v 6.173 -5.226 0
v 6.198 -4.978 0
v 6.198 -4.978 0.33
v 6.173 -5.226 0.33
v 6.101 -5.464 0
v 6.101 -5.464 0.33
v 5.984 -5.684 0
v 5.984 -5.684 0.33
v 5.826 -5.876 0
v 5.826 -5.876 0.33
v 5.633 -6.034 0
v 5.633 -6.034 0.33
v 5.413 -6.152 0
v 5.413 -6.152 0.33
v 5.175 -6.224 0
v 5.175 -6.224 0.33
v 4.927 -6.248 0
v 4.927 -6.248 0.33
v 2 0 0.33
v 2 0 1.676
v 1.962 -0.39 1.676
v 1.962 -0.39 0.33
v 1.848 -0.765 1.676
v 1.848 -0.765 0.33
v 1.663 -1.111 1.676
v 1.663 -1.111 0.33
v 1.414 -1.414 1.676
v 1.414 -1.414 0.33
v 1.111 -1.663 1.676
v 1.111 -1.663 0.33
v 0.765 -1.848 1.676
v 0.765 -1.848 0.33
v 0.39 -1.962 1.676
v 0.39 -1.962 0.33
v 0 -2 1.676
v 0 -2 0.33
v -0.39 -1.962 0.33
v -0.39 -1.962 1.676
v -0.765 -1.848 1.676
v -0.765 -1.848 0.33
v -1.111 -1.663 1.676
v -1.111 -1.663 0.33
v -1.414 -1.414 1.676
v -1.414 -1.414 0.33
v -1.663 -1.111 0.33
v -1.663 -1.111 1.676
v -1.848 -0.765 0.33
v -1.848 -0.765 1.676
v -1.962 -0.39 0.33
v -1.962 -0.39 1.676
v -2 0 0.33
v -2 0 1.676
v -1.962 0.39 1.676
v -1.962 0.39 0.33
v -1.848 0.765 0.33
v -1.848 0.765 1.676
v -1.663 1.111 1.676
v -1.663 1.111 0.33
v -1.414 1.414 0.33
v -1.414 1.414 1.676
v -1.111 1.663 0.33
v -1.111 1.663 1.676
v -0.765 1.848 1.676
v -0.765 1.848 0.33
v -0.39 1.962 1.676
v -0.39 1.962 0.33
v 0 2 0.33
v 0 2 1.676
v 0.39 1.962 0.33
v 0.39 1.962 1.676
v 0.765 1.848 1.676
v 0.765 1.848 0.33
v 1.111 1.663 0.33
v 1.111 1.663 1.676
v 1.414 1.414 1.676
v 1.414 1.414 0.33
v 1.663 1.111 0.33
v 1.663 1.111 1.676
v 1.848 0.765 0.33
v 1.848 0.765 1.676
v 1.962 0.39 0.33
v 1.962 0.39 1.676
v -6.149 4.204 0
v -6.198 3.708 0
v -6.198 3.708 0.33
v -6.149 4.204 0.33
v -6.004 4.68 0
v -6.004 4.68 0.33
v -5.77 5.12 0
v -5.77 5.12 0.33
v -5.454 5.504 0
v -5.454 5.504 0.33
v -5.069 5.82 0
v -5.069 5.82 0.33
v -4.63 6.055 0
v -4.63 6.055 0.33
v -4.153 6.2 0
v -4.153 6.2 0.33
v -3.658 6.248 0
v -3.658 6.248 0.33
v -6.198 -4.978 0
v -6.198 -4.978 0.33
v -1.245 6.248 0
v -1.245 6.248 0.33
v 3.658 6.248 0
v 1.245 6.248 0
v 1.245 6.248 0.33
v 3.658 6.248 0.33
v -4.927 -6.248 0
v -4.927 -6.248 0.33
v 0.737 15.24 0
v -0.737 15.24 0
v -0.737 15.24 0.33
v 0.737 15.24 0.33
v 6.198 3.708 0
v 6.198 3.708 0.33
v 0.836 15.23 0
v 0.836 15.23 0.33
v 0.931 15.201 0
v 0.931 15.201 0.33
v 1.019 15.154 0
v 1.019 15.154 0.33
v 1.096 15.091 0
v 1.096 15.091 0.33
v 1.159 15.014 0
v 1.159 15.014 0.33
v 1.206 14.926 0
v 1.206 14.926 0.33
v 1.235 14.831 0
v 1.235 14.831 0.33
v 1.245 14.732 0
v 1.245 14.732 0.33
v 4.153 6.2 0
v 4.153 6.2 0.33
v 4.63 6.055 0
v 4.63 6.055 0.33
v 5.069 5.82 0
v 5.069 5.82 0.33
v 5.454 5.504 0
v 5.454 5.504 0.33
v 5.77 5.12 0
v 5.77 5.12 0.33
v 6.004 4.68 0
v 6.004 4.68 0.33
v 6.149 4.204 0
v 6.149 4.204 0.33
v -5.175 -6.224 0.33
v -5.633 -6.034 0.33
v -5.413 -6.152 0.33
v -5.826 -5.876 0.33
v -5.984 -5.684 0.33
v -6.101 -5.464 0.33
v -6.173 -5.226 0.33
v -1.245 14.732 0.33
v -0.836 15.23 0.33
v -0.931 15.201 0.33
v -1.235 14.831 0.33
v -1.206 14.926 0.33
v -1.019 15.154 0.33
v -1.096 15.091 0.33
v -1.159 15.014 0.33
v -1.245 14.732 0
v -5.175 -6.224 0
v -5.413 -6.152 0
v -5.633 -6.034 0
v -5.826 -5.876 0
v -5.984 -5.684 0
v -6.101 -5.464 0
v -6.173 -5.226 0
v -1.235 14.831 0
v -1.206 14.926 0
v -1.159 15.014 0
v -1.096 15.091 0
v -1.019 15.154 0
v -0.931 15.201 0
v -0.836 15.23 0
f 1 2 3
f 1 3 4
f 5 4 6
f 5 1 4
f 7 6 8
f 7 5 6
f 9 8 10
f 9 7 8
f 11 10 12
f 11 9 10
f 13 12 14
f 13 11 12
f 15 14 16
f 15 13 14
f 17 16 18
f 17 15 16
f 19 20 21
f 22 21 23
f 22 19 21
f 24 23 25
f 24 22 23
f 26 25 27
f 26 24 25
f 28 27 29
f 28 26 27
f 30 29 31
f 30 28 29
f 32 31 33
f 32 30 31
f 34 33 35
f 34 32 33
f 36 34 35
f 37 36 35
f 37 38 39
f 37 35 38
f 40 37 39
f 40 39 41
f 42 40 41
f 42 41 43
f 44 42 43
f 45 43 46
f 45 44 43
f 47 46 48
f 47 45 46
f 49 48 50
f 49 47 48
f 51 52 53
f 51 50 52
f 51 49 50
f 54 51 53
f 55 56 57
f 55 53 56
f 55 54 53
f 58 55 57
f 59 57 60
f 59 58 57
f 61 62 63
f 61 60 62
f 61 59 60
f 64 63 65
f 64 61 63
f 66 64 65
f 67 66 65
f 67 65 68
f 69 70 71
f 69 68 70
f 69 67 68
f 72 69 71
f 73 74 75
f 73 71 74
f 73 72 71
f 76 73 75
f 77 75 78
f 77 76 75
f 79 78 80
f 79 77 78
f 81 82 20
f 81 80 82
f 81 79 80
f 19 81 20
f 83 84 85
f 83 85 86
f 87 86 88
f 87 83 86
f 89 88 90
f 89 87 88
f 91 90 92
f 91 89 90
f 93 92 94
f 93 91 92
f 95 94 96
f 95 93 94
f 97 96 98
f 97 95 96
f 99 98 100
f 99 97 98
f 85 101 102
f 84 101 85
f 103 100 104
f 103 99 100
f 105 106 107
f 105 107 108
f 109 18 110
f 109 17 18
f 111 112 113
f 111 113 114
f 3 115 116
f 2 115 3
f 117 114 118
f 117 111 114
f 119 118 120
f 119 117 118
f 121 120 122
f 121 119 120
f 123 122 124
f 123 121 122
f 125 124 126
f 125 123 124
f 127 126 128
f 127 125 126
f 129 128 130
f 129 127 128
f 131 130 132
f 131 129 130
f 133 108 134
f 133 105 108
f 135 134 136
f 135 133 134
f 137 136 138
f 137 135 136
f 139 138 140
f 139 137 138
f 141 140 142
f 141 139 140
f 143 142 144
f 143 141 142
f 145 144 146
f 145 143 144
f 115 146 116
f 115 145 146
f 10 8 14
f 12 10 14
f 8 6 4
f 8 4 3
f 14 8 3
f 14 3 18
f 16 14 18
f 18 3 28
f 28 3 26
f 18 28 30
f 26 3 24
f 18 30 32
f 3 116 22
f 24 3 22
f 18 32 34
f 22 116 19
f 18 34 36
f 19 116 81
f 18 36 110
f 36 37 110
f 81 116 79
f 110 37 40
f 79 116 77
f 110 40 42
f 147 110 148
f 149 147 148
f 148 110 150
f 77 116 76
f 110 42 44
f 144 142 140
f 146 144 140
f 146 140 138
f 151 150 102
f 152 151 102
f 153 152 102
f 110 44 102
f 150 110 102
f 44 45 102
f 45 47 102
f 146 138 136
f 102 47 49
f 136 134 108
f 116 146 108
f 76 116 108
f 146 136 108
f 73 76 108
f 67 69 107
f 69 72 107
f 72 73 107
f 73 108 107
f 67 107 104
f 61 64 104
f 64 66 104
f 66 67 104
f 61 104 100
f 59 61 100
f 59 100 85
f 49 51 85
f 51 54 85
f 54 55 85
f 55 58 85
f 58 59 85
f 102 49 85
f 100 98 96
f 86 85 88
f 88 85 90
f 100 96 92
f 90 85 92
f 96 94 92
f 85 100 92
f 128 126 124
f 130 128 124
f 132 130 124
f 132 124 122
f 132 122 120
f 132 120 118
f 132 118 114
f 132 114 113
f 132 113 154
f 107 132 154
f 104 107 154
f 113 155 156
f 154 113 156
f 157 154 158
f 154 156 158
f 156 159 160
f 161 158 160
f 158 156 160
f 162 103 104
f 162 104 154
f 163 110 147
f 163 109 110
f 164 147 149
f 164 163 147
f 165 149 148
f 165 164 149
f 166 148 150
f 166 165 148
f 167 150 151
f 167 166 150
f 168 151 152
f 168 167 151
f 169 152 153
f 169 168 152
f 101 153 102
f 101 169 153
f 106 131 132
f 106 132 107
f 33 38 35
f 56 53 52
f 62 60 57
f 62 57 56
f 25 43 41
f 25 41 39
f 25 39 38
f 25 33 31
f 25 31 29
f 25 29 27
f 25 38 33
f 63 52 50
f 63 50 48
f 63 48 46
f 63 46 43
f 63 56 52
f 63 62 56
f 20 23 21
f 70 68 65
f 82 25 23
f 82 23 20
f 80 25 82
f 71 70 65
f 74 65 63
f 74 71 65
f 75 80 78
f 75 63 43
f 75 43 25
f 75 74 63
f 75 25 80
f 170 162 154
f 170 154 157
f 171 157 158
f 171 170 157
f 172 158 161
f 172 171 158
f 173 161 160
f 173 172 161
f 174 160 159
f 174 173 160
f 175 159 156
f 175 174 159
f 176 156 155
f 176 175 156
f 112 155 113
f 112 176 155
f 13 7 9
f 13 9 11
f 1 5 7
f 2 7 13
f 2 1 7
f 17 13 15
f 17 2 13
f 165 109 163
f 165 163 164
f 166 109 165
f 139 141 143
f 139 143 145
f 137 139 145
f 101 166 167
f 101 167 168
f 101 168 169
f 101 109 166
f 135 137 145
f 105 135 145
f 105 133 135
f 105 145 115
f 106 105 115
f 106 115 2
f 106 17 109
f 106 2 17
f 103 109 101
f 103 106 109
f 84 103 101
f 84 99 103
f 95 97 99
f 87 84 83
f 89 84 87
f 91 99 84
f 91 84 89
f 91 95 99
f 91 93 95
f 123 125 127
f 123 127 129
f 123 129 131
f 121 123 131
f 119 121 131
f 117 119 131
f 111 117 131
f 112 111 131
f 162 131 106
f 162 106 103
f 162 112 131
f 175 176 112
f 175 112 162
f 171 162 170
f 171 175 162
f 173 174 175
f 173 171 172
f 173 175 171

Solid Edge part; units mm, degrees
sketch "Sketch1" plane through (0, 0, 0) normal (0, 0, 1) x (1, 0, 0)
  line L0 (6.1976, 3.7084) -> (6.1976, -4.9781)
  arc A0 (6.1976, -4.9781) -> (4.9273, -6.2484) centre (4.9273, -4.9781) cw
  line L1 (4.9273, -6.2484) -> (-4.9273, -6.2484)
  arc A1 (-4.9273, -6.2484) -> (-6.1976, -4.9781) centre (-4.9273, -4.9781) cw
  line L2 (-6.1976, -4.9781) -> (-6.1976, 3.7084)
  arc A2 (-3.6576, 6.2484) -> (-6.1976, 3.7084) centre (-3.6576, 3.7084) ccw
  line L3 (-3.6576, 6.2484) -> (-1.2446, 6.2484)
  line L4 (-1.2446, 6.2484) -> (-1.2446, 14.732)
  arc A3 (-0.7366, 15.24) -> (-1.2446, 14.732) centre (-0.7366, 14.732) ccw
  line L5 (-0.7366, 15.24) -> (0.7366, 15.24)
  arc A4 (0.7366, 15.24) -> (1.2446, 14.732) centre (0.7366, 14.732) cw
  line L6 (1.2446, 14.732) -> (1.2446, 6.2484)
  line L7 (1.2446, 6.2484) -> (3.6576, 6.2484)
  arc A5 (3.6576, 6.2484) -> (6.1976, 3.7084) centre (3.6576, 3.7084) cw
extrude "Protrusion1" add sketch "Sketch1" along normal blind 0.3302
sketch "Sketch2" plane through (0, 0, 0) normal (0, 0, 1) x (1, 0, 0)
  circle A0 centre (0, 0) radius 2
extrude "ExtrudedCutout_1" add sketch "Sketch2" along normal blind 1.6764
